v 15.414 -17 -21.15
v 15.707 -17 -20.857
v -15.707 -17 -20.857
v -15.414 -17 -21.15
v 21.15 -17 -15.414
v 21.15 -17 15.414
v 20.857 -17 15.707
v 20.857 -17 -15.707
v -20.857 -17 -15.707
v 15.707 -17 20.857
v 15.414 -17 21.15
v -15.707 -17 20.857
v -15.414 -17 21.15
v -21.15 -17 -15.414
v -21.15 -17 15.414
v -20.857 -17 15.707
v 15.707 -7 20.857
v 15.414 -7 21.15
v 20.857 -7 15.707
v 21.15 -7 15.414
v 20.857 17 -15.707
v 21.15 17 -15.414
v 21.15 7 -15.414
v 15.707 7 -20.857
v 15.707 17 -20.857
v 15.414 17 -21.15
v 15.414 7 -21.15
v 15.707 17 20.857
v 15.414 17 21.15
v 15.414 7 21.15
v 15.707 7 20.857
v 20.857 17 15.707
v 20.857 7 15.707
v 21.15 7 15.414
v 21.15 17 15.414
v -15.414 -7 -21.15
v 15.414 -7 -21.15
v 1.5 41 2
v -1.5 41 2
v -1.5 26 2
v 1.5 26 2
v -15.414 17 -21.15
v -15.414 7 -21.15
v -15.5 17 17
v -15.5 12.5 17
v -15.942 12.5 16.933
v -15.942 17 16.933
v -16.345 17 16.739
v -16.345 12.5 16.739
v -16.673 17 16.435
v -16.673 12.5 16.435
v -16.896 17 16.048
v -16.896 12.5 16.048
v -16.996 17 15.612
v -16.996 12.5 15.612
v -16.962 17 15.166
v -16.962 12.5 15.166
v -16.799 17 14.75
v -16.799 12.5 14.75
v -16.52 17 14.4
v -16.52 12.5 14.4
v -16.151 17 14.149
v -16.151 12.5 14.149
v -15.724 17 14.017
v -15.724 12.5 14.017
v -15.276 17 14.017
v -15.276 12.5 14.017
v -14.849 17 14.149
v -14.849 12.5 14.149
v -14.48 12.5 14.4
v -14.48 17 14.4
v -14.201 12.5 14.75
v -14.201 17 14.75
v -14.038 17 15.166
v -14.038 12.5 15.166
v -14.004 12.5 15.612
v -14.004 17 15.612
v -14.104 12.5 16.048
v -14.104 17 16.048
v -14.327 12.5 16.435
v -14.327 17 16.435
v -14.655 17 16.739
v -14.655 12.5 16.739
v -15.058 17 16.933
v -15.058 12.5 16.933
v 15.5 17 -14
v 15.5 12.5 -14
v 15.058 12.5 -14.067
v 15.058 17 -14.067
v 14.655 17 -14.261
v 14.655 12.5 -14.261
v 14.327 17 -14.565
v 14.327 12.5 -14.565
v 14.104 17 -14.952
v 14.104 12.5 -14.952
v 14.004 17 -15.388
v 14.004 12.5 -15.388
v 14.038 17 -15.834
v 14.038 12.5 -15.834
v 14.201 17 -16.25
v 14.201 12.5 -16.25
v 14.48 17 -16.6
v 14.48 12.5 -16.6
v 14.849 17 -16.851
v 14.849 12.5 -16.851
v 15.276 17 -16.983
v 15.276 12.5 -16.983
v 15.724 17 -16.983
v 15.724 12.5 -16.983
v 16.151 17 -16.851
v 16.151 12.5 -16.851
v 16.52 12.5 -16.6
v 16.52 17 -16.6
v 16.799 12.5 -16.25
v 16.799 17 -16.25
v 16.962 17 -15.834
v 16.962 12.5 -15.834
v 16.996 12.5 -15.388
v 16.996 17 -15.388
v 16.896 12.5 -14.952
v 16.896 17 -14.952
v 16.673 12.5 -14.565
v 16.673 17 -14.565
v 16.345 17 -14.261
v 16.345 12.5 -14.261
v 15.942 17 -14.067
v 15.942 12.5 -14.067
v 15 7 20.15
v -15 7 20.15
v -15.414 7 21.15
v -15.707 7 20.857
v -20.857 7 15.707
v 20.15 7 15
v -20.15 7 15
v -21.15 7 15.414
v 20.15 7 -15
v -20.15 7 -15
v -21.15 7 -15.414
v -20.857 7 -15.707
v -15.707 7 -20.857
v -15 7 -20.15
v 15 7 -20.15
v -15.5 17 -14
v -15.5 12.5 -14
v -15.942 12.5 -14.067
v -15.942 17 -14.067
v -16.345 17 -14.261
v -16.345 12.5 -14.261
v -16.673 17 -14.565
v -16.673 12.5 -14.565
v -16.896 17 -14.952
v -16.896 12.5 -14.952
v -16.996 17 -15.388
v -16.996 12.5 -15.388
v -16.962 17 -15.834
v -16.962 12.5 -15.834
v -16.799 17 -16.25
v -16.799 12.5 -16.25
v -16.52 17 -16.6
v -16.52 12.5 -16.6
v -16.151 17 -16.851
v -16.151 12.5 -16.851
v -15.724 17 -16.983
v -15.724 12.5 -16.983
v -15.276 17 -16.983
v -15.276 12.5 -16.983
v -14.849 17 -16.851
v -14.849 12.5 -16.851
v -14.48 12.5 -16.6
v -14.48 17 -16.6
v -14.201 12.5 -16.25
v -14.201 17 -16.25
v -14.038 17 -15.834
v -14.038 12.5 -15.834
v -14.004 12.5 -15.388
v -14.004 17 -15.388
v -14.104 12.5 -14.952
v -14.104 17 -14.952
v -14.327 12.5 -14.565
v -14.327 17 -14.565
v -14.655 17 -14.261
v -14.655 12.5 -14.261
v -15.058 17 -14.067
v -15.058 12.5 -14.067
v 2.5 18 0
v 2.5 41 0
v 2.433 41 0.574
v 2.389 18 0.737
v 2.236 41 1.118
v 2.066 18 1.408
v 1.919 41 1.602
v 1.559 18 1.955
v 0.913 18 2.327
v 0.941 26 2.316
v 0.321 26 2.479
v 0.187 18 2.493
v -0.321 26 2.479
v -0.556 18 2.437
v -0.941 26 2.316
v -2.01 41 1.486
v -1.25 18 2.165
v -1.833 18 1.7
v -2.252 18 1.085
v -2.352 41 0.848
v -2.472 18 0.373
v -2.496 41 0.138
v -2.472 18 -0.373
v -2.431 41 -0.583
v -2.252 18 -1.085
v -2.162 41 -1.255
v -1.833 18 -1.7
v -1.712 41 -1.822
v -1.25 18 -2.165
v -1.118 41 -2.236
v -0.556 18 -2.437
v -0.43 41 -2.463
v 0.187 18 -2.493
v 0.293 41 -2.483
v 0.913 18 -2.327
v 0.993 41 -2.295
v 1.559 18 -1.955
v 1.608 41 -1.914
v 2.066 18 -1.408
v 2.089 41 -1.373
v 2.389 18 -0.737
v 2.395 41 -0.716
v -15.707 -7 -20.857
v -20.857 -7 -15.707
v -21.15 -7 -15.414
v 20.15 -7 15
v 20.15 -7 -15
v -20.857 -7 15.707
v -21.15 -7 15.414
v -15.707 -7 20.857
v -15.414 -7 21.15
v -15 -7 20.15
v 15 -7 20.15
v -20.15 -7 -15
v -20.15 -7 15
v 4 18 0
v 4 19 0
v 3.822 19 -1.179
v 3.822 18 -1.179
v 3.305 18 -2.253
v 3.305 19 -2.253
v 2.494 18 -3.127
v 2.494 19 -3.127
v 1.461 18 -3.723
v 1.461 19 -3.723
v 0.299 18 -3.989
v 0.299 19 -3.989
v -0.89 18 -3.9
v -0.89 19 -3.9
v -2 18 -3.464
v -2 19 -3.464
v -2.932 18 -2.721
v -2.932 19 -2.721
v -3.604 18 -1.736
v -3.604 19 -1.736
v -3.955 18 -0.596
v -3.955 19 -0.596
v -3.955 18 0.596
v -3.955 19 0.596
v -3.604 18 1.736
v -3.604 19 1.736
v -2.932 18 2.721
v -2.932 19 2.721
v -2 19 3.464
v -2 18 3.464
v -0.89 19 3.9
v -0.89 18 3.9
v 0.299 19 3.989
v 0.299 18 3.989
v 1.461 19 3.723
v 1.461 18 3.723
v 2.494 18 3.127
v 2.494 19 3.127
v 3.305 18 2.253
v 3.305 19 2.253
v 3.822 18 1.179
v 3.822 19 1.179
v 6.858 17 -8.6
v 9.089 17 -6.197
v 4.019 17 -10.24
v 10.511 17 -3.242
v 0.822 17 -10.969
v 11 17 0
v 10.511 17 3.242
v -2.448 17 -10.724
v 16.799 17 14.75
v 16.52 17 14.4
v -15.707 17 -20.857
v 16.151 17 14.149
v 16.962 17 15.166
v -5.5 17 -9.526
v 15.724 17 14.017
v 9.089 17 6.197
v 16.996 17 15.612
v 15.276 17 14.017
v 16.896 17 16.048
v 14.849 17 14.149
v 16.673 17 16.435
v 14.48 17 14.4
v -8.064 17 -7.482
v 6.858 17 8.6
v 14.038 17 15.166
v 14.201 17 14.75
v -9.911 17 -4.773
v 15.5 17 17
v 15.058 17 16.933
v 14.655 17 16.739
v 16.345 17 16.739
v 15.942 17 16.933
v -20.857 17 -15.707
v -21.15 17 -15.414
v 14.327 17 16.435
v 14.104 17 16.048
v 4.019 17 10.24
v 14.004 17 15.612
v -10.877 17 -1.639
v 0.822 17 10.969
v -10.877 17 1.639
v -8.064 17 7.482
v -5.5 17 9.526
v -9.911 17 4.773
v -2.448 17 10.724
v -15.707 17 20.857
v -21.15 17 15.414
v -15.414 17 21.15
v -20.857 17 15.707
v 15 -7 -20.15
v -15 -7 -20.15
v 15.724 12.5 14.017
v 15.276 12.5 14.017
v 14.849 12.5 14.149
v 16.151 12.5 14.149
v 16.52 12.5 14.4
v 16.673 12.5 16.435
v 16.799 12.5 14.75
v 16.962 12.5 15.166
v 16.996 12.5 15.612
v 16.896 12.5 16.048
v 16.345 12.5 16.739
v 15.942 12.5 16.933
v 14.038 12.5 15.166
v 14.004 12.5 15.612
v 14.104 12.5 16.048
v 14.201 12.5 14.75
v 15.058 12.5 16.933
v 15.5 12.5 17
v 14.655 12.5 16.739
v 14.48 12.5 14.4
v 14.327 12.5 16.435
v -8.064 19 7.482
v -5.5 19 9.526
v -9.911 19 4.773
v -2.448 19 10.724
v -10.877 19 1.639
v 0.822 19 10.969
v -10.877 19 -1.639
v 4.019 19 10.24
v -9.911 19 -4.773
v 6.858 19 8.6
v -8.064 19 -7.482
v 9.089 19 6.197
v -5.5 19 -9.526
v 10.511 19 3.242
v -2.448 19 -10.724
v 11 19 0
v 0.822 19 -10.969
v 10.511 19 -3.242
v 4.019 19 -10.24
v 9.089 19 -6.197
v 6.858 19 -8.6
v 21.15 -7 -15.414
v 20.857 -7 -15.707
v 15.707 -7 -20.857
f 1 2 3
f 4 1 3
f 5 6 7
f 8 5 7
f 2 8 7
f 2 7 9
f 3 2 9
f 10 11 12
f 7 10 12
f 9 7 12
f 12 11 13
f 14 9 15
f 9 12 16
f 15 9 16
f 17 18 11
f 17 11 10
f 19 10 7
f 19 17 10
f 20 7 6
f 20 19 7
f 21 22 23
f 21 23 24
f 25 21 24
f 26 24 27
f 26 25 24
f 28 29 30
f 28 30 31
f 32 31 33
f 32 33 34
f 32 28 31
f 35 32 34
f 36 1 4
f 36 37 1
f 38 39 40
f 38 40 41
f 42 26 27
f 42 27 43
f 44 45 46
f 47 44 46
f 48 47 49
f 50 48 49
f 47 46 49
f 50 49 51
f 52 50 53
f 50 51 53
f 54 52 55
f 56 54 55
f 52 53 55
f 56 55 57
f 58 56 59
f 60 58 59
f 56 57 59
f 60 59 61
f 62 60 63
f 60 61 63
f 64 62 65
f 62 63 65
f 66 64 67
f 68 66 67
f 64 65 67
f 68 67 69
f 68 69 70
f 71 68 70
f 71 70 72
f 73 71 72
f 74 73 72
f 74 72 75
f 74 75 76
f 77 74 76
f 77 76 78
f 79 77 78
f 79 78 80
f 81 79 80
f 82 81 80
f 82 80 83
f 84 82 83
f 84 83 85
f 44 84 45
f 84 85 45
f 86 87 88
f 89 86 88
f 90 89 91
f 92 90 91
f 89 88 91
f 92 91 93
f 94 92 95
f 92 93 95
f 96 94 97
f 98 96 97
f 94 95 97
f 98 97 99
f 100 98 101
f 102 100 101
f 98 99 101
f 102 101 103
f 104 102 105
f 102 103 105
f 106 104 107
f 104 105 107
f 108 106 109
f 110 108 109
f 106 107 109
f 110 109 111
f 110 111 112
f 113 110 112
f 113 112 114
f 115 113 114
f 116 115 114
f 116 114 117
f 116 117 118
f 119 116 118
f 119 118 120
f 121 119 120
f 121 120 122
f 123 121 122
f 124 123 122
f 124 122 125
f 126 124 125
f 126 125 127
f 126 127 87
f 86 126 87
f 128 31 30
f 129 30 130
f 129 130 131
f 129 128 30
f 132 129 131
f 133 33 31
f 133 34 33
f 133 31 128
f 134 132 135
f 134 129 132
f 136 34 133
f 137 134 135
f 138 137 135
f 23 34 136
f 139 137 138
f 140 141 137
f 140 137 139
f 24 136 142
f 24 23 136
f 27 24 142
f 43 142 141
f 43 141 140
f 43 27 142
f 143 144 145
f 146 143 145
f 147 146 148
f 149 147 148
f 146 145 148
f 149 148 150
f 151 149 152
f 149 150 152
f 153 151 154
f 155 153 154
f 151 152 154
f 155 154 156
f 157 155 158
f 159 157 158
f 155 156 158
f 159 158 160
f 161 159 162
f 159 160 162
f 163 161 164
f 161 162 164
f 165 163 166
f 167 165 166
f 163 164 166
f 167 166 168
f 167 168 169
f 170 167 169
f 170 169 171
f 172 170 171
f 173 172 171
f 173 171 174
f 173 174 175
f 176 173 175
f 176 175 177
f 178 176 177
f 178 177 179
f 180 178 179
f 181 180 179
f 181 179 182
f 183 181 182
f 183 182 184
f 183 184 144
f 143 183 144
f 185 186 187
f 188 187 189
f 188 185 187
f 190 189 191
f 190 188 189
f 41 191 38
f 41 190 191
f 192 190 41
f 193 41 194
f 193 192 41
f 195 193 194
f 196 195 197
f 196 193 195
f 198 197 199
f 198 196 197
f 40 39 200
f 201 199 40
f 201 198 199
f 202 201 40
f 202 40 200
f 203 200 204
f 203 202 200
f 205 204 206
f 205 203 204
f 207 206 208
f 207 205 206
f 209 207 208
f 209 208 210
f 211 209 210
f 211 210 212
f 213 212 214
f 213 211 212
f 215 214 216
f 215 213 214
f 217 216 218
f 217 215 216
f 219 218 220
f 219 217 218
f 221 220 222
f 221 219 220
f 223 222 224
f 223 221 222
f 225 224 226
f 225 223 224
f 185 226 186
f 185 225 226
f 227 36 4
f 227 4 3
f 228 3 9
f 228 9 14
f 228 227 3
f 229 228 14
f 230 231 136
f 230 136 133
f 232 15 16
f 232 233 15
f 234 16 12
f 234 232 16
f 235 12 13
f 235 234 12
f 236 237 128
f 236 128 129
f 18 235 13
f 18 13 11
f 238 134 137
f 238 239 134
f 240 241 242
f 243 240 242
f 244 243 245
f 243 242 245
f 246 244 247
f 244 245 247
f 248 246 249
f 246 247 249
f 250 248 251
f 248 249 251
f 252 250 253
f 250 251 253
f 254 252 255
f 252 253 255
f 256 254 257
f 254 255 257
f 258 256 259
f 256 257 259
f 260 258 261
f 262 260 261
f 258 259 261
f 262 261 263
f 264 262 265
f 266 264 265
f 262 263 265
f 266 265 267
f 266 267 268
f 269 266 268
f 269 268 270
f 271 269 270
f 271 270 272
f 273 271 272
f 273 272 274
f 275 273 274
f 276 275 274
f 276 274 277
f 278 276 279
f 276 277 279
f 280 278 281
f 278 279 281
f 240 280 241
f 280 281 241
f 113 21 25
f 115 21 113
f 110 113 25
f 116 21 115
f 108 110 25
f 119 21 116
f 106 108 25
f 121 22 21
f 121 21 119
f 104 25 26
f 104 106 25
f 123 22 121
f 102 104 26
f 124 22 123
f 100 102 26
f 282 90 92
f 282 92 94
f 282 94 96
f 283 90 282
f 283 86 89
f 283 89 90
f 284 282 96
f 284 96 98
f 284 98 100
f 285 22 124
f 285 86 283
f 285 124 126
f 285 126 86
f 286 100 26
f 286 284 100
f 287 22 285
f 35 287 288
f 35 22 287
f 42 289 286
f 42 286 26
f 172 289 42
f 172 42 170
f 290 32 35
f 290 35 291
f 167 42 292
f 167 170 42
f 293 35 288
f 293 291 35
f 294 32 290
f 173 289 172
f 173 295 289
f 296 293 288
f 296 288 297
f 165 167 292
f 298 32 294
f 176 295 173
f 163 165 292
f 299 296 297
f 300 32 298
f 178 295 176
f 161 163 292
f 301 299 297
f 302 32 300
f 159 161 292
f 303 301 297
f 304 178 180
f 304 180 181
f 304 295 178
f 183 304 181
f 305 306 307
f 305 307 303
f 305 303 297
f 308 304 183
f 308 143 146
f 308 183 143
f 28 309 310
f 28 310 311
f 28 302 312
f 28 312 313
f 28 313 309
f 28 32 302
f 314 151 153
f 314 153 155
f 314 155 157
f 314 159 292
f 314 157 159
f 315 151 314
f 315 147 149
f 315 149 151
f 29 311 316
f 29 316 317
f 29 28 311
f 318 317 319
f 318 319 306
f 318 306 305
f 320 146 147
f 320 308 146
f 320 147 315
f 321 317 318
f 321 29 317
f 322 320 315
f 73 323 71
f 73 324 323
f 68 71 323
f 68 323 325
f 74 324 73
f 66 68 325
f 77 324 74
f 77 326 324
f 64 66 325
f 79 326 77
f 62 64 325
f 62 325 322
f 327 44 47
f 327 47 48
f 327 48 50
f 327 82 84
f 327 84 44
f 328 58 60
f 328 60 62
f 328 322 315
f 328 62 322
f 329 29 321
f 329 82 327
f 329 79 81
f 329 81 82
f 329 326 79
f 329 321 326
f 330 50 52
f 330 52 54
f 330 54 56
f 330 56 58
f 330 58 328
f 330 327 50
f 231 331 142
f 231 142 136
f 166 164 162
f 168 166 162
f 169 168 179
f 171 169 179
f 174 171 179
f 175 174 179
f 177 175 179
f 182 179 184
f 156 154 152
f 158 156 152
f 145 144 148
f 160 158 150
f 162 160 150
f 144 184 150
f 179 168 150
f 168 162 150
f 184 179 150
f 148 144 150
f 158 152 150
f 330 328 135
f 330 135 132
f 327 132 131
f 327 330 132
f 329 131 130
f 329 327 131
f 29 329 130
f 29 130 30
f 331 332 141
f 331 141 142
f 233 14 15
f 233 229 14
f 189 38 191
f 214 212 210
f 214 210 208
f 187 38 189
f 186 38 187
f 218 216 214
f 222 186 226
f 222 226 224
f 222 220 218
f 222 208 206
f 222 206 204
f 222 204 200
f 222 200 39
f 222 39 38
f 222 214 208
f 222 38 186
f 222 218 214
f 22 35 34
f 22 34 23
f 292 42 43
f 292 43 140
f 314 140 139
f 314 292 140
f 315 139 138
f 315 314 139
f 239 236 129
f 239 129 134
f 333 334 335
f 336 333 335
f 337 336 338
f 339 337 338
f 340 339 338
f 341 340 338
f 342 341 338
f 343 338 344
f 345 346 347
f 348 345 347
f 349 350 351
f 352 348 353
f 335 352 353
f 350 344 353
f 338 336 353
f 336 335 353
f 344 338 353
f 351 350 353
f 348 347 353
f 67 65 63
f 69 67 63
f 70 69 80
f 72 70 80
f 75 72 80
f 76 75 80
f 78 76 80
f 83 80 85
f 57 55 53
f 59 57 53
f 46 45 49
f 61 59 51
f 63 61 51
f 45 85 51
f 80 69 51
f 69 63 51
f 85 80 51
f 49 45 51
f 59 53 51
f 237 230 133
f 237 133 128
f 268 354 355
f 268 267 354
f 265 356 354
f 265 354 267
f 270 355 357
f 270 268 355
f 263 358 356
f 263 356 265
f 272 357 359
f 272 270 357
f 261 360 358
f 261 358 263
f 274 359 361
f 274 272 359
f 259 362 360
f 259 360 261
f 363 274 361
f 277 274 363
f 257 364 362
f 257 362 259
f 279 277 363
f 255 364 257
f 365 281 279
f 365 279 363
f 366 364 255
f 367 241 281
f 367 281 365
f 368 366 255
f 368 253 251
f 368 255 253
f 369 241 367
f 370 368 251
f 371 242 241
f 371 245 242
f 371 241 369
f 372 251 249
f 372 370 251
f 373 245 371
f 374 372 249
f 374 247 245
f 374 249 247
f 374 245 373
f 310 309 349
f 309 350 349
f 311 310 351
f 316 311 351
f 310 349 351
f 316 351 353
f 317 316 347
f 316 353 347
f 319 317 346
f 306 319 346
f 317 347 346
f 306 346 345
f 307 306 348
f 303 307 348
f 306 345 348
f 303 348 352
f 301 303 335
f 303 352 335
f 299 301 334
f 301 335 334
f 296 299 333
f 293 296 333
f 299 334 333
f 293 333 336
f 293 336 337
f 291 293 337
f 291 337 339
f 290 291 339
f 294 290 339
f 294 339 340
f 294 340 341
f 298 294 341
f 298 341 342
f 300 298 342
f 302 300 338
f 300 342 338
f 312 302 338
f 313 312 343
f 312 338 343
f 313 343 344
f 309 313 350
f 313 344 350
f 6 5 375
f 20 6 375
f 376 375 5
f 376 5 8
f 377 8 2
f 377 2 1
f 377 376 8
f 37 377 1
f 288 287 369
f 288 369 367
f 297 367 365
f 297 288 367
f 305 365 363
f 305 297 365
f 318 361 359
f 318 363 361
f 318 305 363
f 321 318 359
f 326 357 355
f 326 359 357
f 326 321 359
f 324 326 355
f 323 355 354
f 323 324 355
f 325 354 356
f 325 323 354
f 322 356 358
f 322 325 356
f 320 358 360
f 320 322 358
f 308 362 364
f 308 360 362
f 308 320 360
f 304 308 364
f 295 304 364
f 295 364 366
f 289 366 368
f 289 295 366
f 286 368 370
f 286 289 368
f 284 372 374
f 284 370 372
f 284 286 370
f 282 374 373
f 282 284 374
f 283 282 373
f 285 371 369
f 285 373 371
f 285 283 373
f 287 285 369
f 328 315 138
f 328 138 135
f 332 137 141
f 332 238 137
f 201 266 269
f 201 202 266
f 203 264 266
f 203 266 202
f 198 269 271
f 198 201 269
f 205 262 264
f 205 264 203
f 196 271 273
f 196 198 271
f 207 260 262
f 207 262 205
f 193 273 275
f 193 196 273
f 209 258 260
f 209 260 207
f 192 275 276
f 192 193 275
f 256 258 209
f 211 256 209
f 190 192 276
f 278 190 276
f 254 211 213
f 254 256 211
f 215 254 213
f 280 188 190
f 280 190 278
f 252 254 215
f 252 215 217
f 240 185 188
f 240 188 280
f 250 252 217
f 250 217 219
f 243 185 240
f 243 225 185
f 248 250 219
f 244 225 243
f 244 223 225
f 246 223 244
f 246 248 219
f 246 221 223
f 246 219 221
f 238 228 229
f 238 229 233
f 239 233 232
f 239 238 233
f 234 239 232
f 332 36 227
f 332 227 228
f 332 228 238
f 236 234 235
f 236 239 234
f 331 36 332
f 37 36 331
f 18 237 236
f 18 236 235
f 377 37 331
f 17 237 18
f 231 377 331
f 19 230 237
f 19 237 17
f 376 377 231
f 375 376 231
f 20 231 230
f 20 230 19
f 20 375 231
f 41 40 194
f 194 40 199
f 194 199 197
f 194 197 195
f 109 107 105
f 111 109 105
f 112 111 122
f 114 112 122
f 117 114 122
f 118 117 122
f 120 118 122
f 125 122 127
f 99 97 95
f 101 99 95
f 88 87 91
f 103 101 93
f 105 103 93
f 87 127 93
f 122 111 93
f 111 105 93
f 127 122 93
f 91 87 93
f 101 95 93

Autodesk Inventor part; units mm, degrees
ref_plane "YZ Plane" through (0, 0, 0) normal (1, 0, 0) x (0, 1, 0)
ref_plane "XZ Plane" through (0, 0, 0) normal (0, 1, 0) x (-1, 0, 0)
ref_plane "XY Plane" through (0, 0, 0) normal (0, 0, 1) x (1, 0, 0)
sketch "Sketch2" plane through (0, 0, 0) normal (0, 1, 0) x (-1, 0, 0)
  line L0 (15, 20.15) -> (20.15, 15)
  line L1 (20.15, 15) -> (20.15, -15)
  line L2 (20.15, -15) -> (15, -20.15)
  line L3 (15, -20.15) -> (-15, -20.15)
  line L4 (-15, -20.15) -> (-20.15, -15)
  line L5 (-20.15, -15) -> (-20.15, 15)
  line L6 (-20.15, 15) -> (-15, 20.15)
  line L7 (-15, 20.15) -> (15, 20.15)
  point P0 (0, 0)
  point P1 (20.15, 0)
  point P2 (0, -20.15)
  dimension "d2" = 30
  dimension "d3" = 40.3
  dimension "d4" = 135
extrude "Extrusion1" add sketch "Sketch2" along normal mid plane 34
sketch "Sketch7" plane through (0, 17, 0) normal (0, 1, 0) x (1, 0, 0)
  circle A0 centre (0, 0) radius 11
  dimension "d27" = 22
extrude "Extrusion3" add sketch "Sketch7" along normal blind 2
sketch "Sketch8" plane through (0, 19, 0) normal (0, 1, 0) x (1, 0, 0)
  circle A0 centre (0, 0) radius 4
  dimension "d30" = 8
extrude "Extrusion4" cut sketch "Sketch8" against normal blind 1
sketch "Sketch9" plane through (0, 18, 0) normal (0, 1, 0) x (1, 0, 0)
  circle A0 centre (0, 0) radius 2.5
  dimension "d33" = 5
extrude "Extrusion5" add sketch "Sketch9" along normal blind 23
sketch "Sketch10" plane through (-15, 17, 20.15) normal (0, 0, 1) x (1, 0, 0)
  line L0 (30, 0) -> (30, -34) projected
  line L1 (0, 0) -> (30, 0) projected
  line L2 (0, -34) -> (0, 0) projected
  line L3 (30, -34) -> (0, -34) projected
  line L4 (0, 0) -> (30, 0)
  line L5 (30, 0) -> (30, -10)
  line L6 (30, -10) -> (0, -10)
  line L7 (0, -10) -> (0, 0)
  line L8 (0, 0) -> (30, -10) construction
  line L9 (30, 0) -> (0, -10) construction
  line L10 (0, -24) -> (30, -24)
  line L11 (30, -24) -> (30, -34)
  line L12 (30, -34) -> (0, -34)
  line L13 (0, -34) -> (0, -24)
  line L14 (0, -24) -> (30, -34) construction
  line L15 (30, -24) -> (0, -34) construction
  line L16 (0, 0) -> (30, 0) projected
  point P0 (15, -17)
  point P1 (15, -5)
  point P2 (15, -29)
  dimension "d36" = 10
  dimension "d37" = 10
extrude "Extrusion6" add sketch "Sketch10" along normal blind 1 contours L0 L6 L2 L1 | L0 L3 L2 L10
mirror "Mirror1" about plane through (0, 0, 0) normal (0, 0, 1) of "Extrusion6"
sketch "Sketch11" plane through (20.15, -17, -15) normal (1, 0, 0) x (0, 0, -1)
  line L0 (0, 34) -> (0, 0) projected
  line L1 (-30, 34) -> (0, 34) projected
  line L2 (-30, 34) -> (-30, 0) projected
  line L3 (0, 0) -> (-30, 0) projected
  line L4 (-30, 34) -> (0, 34)
  line L5 (0, 34) -> (0, 24)
  line L6 (0, 24) -> (-30, 24)
  line L7 (-30, 24) -> (-30, 34)
  line L8 (-30, 34) -> (0, 24) construction
  line L9 (0, 34) -> (-30, 24) construction
  line L10 (-30, 10) -> (0, 10)
  line L11 (0, 10) -> (0, 0)
  line L12 (0, 0) -> (-30, 0)
  line L13 (-30, 0) -> (-30, 10)
  line L14 (-30, 10) -> (0, 0) construction
  line L15 (0, 10) -> (-30, 0) construction
  line L16 (-30, 34) -> (0, 34) projected
  point P0 (-15, 17)
  point P1 (-15, 29)
  point P2 (-15, 5)
  dimension "d40" = 10
extrude "Extrusion7" add sketch "Sketch11" along normal blind 1 contours L0 L6 L2 L1 | L0 L3 L2 L10
mirror "Mirror2" about plane through (0, 0, 0) normal (1, 0, 0) of "Extrusion7"
sketch "Sketch12" plane through (-15, -7, 20.15) normal (-0.7071, 0, 0.7071) x (0.7071, 0, 0.7071)
  line L0 (0, -10) -> (0, 0) projected
  line L1 (0, 0) -> (0, 14) projected
  line L2 (0, 14) -> (0, 24) projected
  line L3 (-7.2832, 24) -> (0, 24) projected
  line L4 (-7.2832, 24) -> (-7.2832, 14) projected
  line L5 (-7.2832, 14) -> (-7.2832, 0) projected
  line L6 (-7.2832, 0) -> (-7.2832, -10) projected
  line L7 (0, -10) -> (-7.2832, -10) projected
  line L8 (-7.2832, 24) -> (0, 24)
  line L9 (0, 24) -> (0, 14)
  line L10 (0, 14) -> (-7.2832, 14)
  line L11 (-7.2832, 14) -> (-7.2832, 24)
  line L12 (-7.2832, 24) -> (0, 14) construction
  line L13 (0, 24) -> (-7.2832, 14) construction
  line L14 (-7.2832, 0) -> (0, 0)
  line L15 (0, 0) -> (0, -10)
  line L16 (0, -10) -> (-7.2832, -10)
  line L17 (-7.2832, -10) -> (-7.2832, 0)
  line L18 (-7.2832, 0) -> (0, -10) construction
  line L19 (0, 0) -> (-7.2832, -10) construction
  line L20 (-7.2832, 24) -> (0, 24) projected
  line L21 (0, -10) -> (-7.2832, -10) projected
  point P0 (-3.6416, 7)
  point P1 (-3.6416, 19)
  point P2 (-3.6416, -5)
  dimension "d43" = 10
  dimension "d44" = 10
extrude "Extrusion8" add sketch "Sketch12" along normal blind 1 contours L7 L6 L14 L0 | L10 L4 L3 L2
sketch "Sketch14" plane through (-15, 7, 21.15) normal (-1, 0, 0) x (0, 0, 1)
  line L0 (-1, 0) -> (-1, 10) projected
  line L1 (-1, 0) -> (0, 0) projected
  line L2 (0, 10) -> (0, 0) projected
  line L3 (-1, 10) -> (0, 10) projected
  line L4 (-1, -24) -> (-1, -14) projected
  line L5 (-1, -24) -> (0, -24) projected
  line L6 (0, -14) -> (0, -24) projected
  line L7 (-1, -14) -> (0, -14) projected
  point P0 (-21.15, -7)
extrude "Extrusion9" add sketch "Sketch14" along normal up to surface surface through (-18.2821, -12, 18.2821) normal (-0.7071, 0, 0.7071)
sketch "Sketch15" plane through (-21.15, 7, 15) normal (0, 0, 1) x (1, 0, 0)
  line L0 (1, 10) -> (1, 0) projected
  line L1 (1, 10) -> (0, 10) projected
  line L2 (0, 10) -> (0, 0) projected
  line L3 (1, 0) -> (0, 0) projected
  line L4 (1, -14) -> (1, -24) projected
  line L5 (1, -14) -> (0, -14) projected
  line L6 (0, -14) -> (0, -24) projected
  line L7 (1, -24) -> (0, -24) projected
  point P0 (21.15, -7)
extrude "Extrusion10" add sketch "Sketch15" along normal up to surface surface through (-18.2821, -12, 18.2821) normal (-0.7071, 0, 0.7071)
mirror "Mirror3" about plane through (0, 0, 0) normal (1, 0, 0) of "Extrusion8", "Extrusion9", "Extrusion10"
mirror "Mirror4" about plane through (0, 0, 0) normal (0, 0, 1) of "Extrusion8", "Extrusion9", "Extrusion10", "Mirror3"
sketch "Sketch17" plane through (0, 17, 0) normal (0, 1, 0) x (1, 0, 0)
  line L0 (-21.15, -15.4142) -> (-15.4142, -21.15) projected
  line L1 (-15.4142, -21.15) -> (15.4142, -21.15) projected
  line L2 (21.15, -15.4142) -> (15.4142, -21.15) projected
  line L3 (21.15, -15.4142) -> (21.15, 15.4142) projected
  line L4 (21.15, 15.4142) -> (15.4142, 21.15) projected
  line L5 (15.4142, 21.15) -> (-15.4142, 21.15) projected
  line L6 (-21.15, 15.4142) -> (-15.4142, 21.15) projected
  line L7 (-21.15, 15.4142) -> (-21.15, -15.4142) projected
  circle A0 centre (0, 0) radius 11 projected
  circle A1 centre (-15.5, -15.5) radius 1.5
  circle A2 centre (-15.5, 15.5) radius 1.5
  circle A3 centre (15.5, 15.5) radius 1.5
  circle A4 centre (15.5, -15.5) radius 1.5
  dimension "d53" = 3
  dimension "d54" = 31
  dimension "d55" = 31
  dimension "d57" = 15.5
  dimension "d66" = 15.5
hole "Hole3" at (-15.5, 17, 15.5) at (-15.5, 17, -15.5) at (15.5, 17, -15.5) at (15.5, 17, 15.5) direction (0, -1, 0) diameter 3 depth 4.5
sketch "Sketch19" plane through (0, 41, 0) normal (0, 1, 0) x (1, 0, 0)
  circle A0 centre (0, 0) radius 2.5 projected
  circle A1 centre (0, 0) radius 2.5 projected
  line L0 (-1.5, -2) -> (1.5, -2)
  dimension "d69" = 4.5
extrude "Extrusion12" cut sketch "Sketch19" against normal blind 15 contours L0 A0 picked at (-0.3466, -2.0912)
ref_plane "Work Plane1" through (0, 0, 0) normal (1, 0, 0) x (0, 1, 0)
ref_plane "Work Plane2" through (0, 0, 0) normal (-1, 0, 0) x (0, 1, 0)
ref_plane "Work Plane3" through (0, 0, 0) normal (-1, 0, 0) x (0, 1, 0)
properties part number "Motor_paso"
